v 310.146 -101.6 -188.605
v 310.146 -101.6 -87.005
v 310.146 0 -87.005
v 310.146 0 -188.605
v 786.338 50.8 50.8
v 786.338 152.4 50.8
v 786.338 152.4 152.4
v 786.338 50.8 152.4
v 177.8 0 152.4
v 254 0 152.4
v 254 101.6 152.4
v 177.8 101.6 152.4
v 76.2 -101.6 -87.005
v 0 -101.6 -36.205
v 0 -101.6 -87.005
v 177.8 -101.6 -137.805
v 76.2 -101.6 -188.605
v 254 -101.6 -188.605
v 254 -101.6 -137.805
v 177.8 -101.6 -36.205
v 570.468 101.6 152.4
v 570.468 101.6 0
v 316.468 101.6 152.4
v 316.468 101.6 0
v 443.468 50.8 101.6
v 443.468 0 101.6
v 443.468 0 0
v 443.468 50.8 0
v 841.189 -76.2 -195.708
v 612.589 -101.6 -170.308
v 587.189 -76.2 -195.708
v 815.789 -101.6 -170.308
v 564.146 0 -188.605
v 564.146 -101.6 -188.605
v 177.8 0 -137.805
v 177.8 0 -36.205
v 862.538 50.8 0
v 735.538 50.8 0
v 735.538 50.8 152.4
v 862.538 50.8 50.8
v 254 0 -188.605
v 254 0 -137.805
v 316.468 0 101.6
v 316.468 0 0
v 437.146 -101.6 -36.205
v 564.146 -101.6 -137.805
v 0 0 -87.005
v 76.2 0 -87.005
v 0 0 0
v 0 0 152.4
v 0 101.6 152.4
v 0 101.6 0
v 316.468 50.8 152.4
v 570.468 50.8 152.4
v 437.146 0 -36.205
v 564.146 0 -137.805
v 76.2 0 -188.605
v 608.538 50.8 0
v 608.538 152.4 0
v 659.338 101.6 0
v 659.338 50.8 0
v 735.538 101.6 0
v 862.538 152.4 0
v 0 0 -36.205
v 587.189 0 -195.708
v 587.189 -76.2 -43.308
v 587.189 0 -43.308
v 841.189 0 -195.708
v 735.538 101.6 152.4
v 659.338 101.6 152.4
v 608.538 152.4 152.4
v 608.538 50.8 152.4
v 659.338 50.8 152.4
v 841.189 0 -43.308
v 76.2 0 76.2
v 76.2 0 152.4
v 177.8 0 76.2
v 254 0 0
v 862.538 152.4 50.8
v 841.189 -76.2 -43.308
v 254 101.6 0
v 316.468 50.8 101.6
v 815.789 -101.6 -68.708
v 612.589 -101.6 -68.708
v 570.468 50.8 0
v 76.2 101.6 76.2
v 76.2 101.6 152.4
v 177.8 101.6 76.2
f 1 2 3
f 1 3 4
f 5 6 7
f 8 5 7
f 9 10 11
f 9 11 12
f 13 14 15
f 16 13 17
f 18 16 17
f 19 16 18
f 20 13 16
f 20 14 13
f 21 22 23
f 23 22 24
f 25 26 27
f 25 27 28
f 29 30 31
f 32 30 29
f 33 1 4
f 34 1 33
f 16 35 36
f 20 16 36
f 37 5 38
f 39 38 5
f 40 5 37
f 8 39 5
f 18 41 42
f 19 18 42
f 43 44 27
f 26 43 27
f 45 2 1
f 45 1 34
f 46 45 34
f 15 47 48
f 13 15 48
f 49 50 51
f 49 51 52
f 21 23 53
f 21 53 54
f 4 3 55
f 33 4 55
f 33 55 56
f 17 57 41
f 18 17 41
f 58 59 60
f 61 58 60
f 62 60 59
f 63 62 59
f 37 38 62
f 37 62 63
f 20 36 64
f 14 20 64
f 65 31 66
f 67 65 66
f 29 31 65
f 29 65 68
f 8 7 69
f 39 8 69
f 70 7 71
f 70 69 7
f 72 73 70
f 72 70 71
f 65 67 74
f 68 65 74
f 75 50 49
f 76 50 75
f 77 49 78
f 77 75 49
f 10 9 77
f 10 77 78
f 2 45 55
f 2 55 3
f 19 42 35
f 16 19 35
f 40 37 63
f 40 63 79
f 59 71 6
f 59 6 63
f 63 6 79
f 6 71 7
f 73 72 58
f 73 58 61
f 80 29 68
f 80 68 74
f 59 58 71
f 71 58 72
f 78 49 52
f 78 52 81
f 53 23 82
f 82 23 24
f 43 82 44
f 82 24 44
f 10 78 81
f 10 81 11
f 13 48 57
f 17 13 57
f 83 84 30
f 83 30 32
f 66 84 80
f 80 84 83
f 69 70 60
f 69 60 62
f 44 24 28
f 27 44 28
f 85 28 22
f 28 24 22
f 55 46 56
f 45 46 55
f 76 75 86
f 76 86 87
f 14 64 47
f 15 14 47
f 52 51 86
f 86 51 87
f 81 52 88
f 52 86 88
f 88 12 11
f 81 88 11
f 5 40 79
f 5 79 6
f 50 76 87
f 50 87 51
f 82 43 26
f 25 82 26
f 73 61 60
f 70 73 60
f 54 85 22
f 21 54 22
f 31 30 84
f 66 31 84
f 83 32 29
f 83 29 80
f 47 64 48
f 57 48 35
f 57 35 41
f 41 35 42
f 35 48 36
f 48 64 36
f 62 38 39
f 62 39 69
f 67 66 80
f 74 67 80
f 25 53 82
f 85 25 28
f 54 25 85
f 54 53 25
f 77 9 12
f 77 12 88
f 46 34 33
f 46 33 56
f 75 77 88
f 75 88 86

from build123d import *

# Parameters (mm, degrees)
F1_DEPTH  = 101.6
F3_DEPTH  = 152.4
F4_W      = 127
F4_H      = 50.8
F5_DEPTH  = 50.8
F6_W      = 50.8
F6_H      = 152.4
F7_DEPTH  = 101.6
F8_W      = 76.2
F8_H      = 50.8
F9_DEPTH  = 152.4
F11_DEPTH = 101.6
F13_DEPTH = 101.6
F14_W     = 254
F14_H     = 152.4
F15_DEPTH = 101.6
F16_SIZE  = 25.4


with BuildPart() as f1:
    # F0 (on Front) → F1 (new body)
    with BuildSketch(Plane.XZ):
        Polygon((0, 152.4), (0, 0), (254, 0), (254, 152.4), (177.8, 152.4), (177.8, 76.2), (76.2, 76.2), (76.2, 152.4), align=None)
    extrude(amount=-F1_DEPTH)


with BuildPart() as f3:
    # F2 (on Top) → F3 (new body)
    with BuildSketch(Plane.XY):
        Polygon((316.467922, 101.6), (316.467922, 0), (443.467922, 0), (443.467922, 50.8), (570.467922, 50.8), (570.467922, 101.6), align=None)
    extrude(amount=F3_DEPTH)

    # F4 (on face) → F5 (cut)
    with BuildSketch(Plane.XZ):
        with Locations((379.967922, 127)):
            Rectangle(F4_W, F4_H)
    extrude(amount=-F5_DEPTH, mode=Mode.SUBTRACT)


with BuildPart() as f7:
    # F6 (on face) → F7 (new body)
    with BuildSketch(Plane.XZ.offset(-50.8)):
        with Locations((633.937912, 76.2)):
            Rectangle(F6_W, F6_H)
        Polygon((659.337912, 152.4), (659.337912, 0), (862.537912, 0), (862.537912, 50.8), (786.337912, 50.8), (786.337912, 152.4), align=None)
    extrude(amount=-F7_DEPTH)

    # F8 (on face) → F9 (cut)
    with BuildSketch(Plane.XY.offset(152.4)):
        with Locations((697.437912, 76.2)):
            Rectangle(F8_W, F8_H)
    extrude(amount=-F9_DEPTH, mode=Mode.SUBTRACT)


with BuildPart() as f11:
    # F10 (on Front) → F11 (new body)
    with BuildSketch(Plane.XZ):
        Polygon((177.8, -36.204632), (0, -36.204632), (0, -87.004632), (76.2, -87.004632), (76.2, -188.604632), (254, -188.604632), (254, -137.804632), (177.8, -137.804632), align=None)
    extrude(amount=F11_DEPTH)


with BuildPart() as f13:
    # F12 (on face) → F13 (new body)
    with BuildSketch(Plane.XZ.offset(101.6)):
        Polygon((310.146183, -87.004632), (310.146183, -188.604632), (564.146183, -188.604632), (564.146183, -137.804632), (437.146183, -36.204632), align=None)
    extrude(amount=-F13_DEPTH)


with BuildPart() as f15:
    # F14 (on face) → F15 (new body)
    with BuildSketch(Plane.XZ.offset(101.6)):
        with Locations((714.18938, -119.508022)):
            Rectangle(F14_W, F14_H)
    extrude(amount=-F15_DEPTH)

    # F16
    f16_edges = [f15.edges().sort_by_distance(p)[0] for p in [
        (714.18938, -101.6, -43.308022),
        (714.18938, -101.6, -195.708022),
        (841.18938, -101.6, -119.508022),
        (587.18938, -101.6, -119.508022),
    ]]
    chamfer(f16_edges, length=F16_SIZE)


solid = Compound([f1.part, f3.part, f7.part, f11.part, f13.part, f15.part])
